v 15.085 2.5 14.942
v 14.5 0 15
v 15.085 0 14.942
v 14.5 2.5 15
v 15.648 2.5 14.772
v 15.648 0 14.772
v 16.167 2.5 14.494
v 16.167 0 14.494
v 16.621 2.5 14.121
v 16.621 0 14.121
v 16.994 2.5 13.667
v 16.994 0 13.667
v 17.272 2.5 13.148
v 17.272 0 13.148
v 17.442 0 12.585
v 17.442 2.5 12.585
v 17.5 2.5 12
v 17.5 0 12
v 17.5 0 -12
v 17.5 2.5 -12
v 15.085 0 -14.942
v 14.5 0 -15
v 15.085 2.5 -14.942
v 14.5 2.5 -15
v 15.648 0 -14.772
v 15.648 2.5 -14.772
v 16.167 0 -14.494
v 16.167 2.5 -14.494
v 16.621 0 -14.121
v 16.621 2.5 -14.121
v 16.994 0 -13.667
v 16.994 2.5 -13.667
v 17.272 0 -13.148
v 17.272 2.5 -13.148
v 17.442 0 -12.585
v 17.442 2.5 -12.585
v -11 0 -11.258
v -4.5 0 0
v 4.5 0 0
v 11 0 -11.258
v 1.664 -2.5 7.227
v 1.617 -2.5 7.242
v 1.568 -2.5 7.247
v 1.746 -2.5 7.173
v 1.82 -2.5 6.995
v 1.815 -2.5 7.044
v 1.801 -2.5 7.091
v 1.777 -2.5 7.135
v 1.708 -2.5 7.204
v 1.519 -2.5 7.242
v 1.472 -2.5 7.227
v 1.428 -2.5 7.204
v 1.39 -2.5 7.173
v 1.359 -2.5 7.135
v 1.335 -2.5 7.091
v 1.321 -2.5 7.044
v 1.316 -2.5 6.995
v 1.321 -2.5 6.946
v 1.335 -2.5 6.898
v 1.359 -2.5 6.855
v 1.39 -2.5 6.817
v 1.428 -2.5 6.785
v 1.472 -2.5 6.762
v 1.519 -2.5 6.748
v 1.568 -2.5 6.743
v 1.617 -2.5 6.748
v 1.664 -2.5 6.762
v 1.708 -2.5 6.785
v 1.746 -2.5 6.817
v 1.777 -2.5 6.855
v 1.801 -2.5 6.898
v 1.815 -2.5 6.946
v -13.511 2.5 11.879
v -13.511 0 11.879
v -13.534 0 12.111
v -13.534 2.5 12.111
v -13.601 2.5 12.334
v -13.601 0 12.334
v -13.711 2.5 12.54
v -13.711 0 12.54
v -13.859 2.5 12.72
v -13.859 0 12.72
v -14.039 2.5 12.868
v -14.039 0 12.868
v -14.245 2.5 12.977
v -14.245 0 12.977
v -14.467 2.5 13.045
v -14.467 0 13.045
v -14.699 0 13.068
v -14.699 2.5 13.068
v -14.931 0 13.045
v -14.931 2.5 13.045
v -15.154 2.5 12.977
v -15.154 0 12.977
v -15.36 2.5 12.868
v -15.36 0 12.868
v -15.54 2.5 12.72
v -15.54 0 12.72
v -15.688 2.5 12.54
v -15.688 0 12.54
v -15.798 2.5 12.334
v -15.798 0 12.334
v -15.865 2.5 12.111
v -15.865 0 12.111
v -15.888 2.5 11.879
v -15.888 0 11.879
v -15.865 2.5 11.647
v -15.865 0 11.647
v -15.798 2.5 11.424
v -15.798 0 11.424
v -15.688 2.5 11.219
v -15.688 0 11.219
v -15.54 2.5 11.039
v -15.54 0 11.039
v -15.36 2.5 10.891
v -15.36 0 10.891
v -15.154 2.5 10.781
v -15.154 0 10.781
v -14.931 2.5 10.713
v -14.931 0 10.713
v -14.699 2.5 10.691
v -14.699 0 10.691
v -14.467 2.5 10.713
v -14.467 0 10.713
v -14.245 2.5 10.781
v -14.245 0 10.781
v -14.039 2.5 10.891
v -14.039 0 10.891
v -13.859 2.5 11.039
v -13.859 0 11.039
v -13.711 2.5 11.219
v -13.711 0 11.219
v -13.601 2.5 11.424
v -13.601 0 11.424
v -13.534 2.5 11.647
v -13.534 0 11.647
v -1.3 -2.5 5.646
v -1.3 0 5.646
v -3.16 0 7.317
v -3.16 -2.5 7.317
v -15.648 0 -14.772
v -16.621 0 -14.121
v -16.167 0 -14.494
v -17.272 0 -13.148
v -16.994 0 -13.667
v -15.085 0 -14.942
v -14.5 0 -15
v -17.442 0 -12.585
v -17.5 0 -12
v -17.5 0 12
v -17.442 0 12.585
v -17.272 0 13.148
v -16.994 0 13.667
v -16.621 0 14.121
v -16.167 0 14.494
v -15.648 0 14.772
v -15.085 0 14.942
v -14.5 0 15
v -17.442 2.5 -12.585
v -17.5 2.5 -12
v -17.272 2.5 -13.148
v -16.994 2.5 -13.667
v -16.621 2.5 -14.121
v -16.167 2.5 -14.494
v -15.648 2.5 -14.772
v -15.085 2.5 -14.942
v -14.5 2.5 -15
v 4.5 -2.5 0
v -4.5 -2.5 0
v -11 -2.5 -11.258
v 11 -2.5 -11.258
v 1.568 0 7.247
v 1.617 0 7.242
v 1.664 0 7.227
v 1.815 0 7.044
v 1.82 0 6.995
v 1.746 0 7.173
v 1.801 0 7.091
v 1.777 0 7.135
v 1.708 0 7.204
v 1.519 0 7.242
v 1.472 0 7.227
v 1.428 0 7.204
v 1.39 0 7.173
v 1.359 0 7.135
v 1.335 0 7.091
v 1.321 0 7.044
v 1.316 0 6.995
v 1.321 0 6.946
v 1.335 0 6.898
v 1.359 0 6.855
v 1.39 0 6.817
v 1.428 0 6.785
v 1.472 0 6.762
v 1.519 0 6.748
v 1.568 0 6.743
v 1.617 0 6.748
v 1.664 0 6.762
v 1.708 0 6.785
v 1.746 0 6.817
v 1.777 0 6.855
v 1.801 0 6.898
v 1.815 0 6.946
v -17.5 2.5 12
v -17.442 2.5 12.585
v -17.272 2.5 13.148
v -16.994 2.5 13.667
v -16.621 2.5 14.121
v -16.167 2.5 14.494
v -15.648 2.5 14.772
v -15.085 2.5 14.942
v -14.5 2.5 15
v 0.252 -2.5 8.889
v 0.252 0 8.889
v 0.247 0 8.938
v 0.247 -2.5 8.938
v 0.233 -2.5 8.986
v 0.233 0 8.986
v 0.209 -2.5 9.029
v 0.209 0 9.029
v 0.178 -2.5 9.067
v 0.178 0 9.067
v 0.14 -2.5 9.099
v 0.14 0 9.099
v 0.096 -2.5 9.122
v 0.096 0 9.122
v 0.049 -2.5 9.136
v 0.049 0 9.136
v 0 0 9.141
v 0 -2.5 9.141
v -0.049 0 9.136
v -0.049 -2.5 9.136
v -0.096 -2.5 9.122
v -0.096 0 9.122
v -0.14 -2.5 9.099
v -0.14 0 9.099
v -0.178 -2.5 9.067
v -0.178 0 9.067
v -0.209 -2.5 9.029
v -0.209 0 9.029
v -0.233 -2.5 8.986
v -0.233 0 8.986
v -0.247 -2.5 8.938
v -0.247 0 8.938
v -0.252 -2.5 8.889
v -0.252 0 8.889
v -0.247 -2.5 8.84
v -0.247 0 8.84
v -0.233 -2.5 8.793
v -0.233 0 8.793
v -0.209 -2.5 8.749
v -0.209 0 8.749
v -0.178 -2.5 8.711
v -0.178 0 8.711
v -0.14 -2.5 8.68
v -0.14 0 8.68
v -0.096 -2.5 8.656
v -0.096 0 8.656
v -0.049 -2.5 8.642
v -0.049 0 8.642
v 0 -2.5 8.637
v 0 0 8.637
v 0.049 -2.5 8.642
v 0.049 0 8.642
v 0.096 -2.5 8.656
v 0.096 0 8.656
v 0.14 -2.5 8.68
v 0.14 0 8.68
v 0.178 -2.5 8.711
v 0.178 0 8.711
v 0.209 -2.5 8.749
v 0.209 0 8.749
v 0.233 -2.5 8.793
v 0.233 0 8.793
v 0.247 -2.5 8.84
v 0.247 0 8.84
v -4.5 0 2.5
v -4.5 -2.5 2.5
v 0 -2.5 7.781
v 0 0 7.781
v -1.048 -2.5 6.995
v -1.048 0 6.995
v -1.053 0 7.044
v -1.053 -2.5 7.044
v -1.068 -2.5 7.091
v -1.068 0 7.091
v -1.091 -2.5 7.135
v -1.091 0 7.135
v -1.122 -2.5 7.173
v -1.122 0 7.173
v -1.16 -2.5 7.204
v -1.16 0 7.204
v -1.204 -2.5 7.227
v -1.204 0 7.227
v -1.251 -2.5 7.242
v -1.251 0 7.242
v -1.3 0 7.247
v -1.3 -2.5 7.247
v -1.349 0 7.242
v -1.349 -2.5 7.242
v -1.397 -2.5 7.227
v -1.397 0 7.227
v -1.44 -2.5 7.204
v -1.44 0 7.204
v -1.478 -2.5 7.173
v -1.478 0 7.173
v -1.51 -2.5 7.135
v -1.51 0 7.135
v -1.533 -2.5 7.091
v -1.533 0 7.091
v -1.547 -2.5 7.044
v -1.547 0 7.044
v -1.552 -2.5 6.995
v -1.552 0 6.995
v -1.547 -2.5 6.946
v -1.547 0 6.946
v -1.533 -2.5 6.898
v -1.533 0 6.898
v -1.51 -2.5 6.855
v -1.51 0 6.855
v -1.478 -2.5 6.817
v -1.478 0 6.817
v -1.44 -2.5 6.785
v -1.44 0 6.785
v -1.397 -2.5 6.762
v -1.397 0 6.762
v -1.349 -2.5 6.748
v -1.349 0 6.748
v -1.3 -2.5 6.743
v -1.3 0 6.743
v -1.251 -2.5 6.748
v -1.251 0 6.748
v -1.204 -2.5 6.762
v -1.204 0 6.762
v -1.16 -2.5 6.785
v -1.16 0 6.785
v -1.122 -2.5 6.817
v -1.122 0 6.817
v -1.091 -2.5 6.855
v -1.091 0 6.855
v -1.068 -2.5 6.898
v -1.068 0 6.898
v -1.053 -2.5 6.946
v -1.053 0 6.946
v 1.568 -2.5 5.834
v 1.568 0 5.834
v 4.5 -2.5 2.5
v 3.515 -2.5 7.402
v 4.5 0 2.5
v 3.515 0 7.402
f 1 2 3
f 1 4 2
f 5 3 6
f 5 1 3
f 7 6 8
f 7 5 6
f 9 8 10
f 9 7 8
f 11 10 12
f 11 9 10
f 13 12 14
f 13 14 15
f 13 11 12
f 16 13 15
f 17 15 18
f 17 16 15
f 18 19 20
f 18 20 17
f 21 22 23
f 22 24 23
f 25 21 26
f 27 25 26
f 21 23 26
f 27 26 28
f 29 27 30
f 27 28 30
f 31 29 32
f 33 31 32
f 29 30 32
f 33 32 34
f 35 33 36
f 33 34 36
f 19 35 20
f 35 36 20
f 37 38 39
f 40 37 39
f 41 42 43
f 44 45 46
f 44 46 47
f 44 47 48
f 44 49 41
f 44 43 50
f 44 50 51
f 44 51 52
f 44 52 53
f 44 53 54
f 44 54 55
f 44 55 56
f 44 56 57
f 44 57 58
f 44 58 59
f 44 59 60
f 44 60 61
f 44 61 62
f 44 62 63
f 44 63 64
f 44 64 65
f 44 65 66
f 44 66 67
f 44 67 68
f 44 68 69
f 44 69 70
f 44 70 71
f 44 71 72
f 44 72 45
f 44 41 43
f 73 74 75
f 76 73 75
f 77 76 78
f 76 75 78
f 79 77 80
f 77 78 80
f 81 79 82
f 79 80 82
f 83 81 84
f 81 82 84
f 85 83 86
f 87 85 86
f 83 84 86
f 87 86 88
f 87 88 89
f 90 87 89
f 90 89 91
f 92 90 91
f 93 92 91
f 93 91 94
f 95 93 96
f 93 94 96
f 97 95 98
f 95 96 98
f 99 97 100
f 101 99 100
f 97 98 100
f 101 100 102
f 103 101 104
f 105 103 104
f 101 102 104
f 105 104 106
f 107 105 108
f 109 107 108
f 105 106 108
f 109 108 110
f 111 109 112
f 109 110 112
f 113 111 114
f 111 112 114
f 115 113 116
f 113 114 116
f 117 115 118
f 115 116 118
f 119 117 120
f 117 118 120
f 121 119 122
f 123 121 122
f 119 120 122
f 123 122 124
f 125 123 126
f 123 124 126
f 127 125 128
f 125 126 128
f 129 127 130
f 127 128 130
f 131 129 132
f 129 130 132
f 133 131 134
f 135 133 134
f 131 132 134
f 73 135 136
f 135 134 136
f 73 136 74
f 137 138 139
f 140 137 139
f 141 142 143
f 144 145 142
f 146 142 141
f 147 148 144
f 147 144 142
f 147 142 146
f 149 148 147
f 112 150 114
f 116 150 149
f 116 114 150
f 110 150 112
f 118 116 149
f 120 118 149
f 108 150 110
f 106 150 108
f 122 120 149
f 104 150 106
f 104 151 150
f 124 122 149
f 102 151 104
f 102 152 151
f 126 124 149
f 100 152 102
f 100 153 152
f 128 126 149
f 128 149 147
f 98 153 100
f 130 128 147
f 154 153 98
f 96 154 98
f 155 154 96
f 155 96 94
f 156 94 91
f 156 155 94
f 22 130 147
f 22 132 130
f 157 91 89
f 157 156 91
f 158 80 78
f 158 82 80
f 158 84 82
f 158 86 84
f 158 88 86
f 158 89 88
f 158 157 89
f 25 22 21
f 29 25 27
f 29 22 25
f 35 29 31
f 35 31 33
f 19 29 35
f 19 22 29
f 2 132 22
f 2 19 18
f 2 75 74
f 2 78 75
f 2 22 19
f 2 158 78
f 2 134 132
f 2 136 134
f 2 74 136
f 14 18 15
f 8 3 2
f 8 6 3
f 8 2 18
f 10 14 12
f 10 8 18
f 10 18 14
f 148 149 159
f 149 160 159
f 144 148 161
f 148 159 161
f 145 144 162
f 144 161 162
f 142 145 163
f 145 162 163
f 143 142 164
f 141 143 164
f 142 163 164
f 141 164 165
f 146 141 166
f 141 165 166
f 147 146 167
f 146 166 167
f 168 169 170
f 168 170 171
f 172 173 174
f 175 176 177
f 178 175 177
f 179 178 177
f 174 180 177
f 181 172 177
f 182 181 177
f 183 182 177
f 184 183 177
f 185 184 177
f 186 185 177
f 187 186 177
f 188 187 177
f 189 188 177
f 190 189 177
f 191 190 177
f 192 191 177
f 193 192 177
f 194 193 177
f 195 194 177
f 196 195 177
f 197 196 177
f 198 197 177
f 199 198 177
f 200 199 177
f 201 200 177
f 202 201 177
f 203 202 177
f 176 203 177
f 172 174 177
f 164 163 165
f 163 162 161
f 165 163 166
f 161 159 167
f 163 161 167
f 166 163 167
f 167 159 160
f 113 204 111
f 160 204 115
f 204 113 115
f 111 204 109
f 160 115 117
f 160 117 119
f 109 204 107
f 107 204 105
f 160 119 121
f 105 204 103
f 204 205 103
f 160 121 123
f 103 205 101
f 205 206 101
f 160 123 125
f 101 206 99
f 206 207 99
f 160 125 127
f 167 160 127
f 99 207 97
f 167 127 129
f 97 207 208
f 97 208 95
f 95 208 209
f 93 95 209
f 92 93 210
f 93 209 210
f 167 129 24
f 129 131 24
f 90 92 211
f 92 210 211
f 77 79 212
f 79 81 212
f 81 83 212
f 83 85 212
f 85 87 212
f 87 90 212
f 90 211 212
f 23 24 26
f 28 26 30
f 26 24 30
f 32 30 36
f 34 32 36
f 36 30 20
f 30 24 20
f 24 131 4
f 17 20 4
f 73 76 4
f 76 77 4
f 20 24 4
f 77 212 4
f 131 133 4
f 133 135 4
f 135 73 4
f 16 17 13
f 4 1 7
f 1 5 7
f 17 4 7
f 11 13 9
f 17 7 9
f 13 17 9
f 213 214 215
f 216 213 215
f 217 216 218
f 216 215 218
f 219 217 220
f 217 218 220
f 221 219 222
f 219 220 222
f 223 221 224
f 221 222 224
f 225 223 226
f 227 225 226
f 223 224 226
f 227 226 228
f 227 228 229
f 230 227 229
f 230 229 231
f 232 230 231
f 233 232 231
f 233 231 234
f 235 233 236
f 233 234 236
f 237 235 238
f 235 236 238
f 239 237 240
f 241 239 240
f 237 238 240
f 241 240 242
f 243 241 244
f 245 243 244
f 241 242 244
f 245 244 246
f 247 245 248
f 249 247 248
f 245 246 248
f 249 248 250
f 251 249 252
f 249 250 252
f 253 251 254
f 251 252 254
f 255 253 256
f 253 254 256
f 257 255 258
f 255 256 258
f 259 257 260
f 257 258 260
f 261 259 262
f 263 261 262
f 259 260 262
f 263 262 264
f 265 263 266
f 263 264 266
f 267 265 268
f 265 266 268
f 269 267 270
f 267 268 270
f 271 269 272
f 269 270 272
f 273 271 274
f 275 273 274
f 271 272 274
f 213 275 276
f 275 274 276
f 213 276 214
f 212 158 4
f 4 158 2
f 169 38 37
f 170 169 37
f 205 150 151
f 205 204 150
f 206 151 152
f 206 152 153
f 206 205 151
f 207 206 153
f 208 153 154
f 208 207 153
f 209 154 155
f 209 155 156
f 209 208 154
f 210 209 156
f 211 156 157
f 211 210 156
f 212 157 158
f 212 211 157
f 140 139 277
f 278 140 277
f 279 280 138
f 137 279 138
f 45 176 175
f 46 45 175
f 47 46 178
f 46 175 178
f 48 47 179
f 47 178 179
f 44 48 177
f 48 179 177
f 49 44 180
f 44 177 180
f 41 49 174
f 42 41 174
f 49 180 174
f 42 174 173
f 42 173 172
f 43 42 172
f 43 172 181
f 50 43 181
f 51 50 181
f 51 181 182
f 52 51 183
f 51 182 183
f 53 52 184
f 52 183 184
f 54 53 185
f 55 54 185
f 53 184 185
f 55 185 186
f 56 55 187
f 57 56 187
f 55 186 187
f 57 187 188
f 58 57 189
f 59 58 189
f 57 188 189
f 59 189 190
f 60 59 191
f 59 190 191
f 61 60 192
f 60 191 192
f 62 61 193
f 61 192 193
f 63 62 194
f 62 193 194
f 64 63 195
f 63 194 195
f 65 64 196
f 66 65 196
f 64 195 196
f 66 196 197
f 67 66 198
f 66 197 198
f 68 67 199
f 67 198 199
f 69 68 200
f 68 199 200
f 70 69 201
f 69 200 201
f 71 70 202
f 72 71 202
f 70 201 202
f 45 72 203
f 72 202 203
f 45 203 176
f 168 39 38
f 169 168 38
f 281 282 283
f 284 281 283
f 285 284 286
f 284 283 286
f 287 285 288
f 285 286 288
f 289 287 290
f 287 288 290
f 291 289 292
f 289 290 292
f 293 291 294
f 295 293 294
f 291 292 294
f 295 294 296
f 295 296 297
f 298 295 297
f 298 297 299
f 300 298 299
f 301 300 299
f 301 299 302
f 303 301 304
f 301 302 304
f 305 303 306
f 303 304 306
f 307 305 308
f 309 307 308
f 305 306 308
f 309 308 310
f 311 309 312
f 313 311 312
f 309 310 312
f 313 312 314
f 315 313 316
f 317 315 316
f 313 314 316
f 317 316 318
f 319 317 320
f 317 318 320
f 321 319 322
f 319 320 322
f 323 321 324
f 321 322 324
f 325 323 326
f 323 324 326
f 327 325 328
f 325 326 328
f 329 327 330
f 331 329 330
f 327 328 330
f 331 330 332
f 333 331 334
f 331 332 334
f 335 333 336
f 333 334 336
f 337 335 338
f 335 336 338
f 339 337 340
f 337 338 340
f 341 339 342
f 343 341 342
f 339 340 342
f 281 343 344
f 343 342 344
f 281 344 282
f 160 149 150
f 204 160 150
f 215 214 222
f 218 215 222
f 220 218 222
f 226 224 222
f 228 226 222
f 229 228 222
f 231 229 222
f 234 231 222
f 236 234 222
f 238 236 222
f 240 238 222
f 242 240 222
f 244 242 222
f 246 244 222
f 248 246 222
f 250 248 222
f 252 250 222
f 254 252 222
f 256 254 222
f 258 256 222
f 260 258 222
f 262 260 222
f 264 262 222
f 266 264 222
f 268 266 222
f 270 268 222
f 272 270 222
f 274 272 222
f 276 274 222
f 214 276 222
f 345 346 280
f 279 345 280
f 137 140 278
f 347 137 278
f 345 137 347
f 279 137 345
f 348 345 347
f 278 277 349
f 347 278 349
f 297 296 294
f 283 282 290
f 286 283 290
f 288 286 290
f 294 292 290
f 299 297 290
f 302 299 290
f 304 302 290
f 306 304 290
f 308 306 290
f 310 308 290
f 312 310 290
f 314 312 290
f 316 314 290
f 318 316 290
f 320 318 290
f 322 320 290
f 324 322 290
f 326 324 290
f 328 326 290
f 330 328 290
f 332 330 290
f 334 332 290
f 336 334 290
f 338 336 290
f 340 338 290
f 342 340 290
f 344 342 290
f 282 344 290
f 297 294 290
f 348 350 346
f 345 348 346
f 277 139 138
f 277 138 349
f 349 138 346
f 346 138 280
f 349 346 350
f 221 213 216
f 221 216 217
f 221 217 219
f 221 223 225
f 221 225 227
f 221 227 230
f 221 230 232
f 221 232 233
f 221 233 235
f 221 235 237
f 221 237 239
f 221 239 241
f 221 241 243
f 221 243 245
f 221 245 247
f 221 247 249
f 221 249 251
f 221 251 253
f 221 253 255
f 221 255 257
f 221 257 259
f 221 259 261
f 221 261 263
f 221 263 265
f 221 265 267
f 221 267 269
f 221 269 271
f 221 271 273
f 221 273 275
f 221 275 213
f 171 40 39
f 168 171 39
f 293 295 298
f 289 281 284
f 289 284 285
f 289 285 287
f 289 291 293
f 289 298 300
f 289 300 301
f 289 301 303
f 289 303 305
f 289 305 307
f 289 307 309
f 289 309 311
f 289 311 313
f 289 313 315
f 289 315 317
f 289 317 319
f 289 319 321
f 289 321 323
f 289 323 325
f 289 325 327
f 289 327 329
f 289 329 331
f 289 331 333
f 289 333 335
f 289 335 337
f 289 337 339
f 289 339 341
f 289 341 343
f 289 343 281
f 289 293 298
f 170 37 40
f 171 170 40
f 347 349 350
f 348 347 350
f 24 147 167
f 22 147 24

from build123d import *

# Parameters (mm, degrees)
F0_W     = 35
F0_H     = 30
F0_R     = 1.188623
F1_DEPTH = 2.5
F2_R     = 0.251874
F3_DEPTH = 2.5
F4_R     = 3


with BuildPart() as f1:
    # F0 (on Front) → F1 (new body)
    with BuildSketch(Plane.XZ):
        Rectangle(F0_W, F0_H)
        with Locations((-14.699375, 11.879263)):
            Circle(F0_R, mode=Mode.SUBTRACT)
    extrude(amount=-F1_DEPTH)

    # F4
    f4_edges = [f1.edges().sort_by_distance(p)[0] for p in [
        (17.5, 1.25, 15),
        (-17.5, 1.25, 15),
        (-17.5, 1.25, -15),
        (17.5, 1.25, -15),
    ]]
    fillet(f4_edges, radius=F4_R)


with BuildPart() as f3:
    # F2 (on Front) → F3 (new body)
    with BuildSketch(Plane.XZ):
        Polygon((-4.5, 0), (-11, -11.25833), (11, -11.25833), (4.5, 0), align=None)
        Polygon((-4.5, 2.5), (4.5, 2.5), (3.515135, 7.402045), (1.567945, 5.8341), (0, 7.78129), (-1.300305, 5.64606), (-3.159824, 7.317045), align=None)
        with Locations((0, 8.889182)):
            Circle(F2_R)
        with Locations((-1.300305, 6.994669)):
            Circle(F2_R)
        with Locations((1.567945, 6.994669)):
            Circle(F2_R)
    extrude(amount=F3_DEPTH)


solid = Compound([f1.part, f3.part])
